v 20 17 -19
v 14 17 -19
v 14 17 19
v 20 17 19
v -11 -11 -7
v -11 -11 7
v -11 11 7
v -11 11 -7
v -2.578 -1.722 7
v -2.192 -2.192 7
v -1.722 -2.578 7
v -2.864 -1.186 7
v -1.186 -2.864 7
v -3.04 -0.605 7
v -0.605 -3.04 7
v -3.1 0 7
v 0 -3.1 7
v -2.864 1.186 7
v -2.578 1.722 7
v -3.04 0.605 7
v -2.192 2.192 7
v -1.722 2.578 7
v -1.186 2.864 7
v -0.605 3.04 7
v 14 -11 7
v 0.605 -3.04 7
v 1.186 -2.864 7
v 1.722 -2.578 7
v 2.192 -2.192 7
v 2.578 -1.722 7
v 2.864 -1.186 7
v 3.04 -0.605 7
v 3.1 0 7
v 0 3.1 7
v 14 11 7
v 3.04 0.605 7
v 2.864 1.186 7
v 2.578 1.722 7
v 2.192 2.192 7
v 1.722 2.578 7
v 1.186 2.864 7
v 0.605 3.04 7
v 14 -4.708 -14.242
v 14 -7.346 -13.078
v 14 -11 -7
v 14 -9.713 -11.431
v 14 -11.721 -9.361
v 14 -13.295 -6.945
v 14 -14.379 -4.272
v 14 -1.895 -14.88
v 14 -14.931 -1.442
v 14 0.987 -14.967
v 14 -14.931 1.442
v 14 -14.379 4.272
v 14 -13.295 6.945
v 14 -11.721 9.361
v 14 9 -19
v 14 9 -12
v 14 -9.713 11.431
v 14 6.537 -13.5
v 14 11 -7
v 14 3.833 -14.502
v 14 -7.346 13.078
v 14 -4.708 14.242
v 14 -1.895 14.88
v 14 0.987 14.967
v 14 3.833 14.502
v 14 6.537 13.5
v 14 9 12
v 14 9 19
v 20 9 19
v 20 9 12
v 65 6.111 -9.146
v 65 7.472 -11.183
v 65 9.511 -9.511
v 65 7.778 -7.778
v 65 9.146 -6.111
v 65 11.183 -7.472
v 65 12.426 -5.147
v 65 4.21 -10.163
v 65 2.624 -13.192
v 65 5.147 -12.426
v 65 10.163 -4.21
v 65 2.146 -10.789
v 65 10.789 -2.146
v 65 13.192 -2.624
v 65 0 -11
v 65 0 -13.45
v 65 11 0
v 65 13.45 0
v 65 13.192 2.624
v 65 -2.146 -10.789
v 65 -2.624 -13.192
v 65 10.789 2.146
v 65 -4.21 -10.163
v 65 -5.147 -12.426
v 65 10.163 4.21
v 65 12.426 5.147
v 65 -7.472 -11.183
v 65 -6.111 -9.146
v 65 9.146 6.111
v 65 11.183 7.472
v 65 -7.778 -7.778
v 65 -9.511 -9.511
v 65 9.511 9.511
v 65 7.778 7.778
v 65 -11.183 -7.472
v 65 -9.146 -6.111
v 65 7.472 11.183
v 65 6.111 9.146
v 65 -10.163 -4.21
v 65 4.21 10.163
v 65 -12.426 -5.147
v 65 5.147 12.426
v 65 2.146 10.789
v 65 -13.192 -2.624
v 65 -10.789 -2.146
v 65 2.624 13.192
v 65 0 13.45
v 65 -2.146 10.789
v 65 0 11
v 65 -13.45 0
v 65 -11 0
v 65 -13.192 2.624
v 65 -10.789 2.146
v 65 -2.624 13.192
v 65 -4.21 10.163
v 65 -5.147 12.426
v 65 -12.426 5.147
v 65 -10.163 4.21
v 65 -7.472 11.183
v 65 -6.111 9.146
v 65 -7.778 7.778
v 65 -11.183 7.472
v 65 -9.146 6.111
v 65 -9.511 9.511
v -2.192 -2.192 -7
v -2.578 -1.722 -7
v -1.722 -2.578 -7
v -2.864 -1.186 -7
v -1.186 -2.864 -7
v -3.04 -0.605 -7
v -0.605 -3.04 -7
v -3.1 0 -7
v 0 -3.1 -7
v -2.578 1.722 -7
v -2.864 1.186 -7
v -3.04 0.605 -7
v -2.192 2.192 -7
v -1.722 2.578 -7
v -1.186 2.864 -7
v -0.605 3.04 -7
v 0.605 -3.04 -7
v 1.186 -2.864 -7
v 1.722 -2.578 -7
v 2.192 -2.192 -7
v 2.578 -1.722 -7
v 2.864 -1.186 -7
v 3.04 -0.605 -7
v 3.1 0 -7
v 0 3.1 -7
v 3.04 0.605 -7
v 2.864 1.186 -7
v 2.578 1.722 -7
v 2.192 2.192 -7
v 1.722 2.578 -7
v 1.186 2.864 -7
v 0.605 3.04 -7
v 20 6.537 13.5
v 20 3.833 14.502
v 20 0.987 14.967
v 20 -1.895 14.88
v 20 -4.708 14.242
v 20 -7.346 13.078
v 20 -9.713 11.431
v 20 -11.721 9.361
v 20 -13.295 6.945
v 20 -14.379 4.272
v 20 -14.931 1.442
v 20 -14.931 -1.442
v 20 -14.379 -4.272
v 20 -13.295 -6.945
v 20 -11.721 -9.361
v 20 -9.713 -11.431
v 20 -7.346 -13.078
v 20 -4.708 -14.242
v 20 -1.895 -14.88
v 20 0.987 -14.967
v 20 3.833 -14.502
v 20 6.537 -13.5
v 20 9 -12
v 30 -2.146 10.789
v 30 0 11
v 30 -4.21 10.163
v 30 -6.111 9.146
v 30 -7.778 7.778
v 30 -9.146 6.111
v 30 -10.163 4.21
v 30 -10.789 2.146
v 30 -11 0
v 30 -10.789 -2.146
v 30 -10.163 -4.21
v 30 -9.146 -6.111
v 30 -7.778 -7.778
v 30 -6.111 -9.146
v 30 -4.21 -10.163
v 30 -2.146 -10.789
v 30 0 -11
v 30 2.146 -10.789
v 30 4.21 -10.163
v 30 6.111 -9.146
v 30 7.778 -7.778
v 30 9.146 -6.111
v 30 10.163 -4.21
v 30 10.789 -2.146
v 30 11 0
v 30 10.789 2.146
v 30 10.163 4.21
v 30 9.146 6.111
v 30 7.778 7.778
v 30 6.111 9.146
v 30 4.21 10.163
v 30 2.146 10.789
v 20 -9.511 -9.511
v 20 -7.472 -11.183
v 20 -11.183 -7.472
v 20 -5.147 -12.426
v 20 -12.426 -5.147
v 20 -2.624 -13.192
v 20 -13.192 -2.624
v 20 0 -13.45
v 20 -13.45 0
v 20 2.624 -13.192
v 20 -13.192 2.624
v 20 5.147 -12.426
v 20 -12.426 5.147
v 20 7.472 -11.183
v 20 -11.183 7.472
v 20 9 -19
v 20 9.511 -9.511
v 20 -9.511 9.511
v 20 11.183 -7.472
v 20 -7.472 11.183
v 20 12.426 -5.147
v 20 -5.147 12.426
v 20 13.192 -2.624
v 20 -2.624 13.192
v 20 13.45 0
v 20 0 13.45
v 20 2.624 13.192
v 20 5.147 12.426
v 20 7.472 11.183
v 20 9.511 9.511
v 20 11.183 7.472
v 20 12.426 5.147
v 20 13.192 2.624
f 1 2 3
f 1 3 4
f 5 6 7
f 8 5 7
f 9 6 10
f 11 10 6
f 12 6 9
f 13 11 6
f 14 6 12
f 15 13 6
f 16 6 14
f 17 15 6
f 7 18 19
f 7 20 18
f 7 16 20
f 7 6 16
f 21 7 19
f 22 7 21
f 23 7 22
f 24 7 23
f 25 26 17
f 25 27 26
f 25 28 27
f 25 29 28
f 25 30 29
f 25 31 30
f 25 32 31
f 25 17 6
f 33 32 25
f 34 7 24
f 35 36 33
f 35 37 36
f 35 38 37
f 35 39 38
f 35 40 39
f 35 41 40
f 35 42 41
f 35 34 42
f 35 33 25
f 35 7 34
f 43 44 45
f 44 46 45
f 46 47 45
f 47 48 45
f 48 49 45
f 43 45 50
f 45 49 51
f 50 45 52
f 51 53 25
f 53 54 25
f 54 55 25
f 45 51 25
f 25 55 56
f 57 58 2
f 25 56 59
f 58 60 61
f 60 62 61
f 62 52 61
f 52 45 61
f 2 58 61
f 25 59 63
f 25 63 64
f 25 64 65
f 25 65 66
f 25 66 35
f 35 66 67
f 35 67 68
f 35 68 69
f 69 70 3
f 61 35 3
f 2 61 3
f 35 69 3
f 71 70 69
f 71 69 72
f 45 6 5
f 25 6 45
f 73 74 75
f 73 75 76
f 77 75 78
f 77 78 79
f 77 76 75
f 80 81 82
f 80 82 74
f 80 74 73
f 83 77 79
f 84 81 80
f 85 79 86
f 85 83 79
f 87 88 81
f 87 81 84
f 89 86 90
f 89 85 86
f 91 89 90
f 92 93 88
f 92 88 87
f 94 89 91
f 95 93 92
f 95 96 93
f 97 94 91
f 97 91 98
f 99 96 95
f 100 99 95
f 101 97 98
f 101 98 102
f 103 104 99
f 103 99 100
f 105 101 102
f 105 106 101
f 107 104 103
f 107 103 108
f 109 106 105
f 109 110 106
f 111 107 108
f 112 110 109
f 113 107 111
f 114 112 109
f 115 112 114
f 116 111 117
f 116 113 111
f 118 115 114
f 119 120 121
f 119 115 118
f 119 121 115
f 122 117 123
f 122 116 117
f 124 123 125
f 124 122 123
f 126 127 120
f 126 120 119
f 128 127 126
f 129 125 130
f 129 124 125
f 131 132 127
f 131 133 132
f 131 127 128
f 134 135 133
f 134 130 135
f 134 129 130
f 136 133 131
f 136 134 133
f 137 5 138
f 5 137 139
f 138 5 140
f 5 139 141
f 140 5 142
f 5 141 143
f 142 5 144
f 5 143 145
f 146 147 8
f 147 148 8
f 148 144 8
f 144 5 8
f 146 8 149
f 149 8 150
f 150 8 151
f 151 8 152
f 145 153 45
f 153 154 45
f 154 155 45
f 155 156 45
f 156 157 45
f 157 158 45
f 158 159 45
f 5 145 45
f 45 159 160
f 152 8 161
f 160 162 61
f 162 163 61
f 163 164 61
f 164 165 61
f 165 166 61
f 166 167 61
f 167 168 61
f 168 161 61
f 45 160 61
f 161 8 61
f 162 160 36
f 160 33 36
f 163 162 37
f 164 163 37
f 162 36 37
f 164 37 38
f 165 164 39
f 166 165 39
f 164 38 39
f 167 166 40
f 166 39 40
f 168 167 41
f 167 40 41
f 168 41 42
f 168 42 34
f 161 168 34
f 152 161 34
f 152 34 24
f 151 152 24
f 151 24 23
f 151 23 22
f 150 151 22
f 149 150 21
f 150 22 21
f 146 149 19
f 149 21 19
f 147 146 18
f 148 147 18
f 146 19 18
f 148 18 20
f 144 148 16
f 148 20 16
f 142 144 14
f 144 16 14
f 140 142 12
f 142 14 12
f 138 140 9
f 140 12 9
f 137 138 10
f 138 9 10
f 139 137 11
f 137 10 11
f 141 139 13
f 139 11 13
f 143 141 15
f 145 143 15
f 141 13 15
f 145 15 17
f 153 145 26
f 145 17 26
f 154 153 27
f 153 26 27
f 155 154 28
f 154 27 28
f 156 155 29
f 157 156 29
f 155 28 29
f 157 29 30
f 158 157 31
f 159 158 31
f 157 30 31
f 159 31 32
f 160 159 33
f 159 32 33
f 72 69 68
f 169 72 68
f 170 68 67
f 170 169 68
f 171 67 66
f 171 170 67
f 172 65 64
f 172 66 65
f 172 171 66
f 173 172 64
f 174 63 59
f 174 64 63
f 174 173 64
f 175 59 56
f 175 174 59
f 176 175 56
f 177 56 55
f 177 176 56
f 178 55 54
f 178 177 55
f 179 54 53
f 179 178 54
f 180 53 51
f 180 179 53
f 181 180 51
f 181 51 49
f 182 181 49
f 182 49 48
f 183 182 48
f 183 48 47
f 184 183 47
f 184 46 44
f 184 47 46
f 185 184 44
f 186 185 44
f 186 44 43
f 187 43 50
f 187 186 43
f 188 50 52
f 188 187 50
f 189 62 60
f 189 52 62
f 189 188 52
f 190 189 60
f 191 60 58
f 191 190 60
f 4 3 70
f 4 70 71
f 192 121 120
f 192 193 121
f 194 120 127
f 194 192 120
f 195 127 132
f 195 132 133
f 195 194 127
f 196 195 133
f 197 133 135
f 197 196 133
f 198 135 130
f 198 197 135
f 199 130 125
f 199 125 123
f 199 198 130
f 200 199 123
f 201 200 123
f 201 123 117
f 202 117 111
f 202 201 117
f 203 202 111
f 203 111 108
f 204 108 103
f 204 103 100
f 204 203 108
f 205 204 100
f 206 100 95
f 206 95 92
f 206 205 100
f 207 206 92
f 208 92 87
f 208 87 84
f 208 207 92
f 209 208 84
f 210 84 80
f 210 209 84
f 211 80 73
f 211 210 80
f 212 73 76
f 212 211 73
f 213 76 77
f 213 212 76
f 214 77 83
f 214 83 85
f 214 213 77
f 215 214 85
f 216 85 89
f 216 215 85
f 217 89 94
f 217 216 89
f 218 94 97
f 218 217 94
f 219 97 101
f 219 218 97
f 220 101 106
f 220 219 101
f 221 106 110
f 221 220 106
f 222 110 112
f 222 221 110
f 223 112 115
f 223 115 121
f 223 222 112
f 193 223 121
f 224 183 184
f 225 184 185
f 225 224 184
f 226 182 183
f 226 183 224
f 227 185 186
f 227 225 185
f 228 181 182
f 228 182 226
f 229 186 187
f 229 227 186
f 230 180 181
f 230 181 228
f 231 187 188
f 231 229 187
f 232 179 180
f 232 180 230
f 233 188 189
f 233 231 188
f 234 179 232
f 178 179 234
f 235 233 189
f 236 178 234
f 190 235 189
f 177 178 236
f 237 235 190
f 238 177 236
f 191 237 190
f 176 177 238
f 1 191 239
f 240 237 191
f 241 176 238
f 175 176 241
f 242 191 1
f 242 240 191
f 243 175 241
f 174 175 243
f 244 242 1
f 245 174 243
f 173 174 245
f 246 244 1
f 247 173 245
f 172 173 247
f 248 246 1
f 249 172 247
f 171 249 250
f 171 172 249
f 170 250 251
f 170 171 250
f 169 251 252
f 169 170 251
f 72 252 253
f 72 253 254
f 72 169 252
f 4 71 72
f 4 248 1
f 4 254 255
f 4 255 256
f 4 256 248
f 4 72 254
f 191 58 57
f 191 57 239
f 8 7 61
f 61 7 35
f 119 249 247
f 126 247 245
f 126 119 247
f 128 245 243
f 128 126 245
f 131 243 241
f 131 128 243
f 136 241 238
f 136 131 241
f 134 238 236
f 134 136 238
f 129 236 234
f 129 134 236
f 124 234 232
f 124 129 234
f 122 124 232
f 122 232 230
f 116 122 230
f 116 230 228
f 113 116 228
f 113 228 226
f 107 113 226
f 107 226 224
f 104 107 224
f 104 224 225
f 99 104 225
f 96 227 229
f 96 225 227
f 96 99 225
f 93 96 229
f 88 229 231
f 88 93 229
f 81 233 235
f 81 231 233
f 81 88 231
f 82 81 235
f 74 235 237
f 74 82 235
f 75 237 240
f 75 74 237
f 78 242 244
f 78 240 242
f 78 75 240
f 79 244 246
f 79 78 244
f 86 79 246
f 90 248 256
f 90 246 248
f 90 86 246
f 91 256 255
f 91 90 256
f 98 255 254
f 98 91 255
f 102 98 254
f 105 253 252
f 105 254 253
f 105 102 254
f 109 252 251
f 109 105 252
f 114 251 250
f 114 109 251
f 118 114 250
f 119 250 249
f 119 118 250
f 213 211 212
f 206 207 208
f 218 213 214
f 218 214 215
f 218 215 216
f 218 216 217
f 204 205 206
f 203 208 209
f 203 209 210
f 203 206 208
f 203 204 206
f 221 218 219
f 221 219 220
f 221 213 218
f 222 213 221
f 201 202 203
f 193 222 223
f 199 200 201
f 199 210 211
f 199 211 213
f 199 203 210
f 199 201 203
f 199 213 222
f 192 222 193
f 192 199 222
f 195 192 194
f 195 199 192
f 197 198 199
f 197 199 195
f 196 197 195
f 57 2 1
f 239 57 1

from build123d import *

# Parameters (mm, degrees)
TONGUE_SKETCH_W   = 27
TONGUE_SKETCH_H   = 22
TONGUE_DEPTH      = 7
PAD_SKETCH_W      = 6
PAD_SKETCH_H      = 8
SWITCH_PAD_DEPTH  = 19
PIN_HOLE_SKETCH_R = 3.1
PIN_HOLE_DEPTH    = 10


with BuildPart() as part:
    # Stem Sketch → Stem (revolve)
    with BuildSketch(Plane.XY):
        Polygon((14, 0), (14, 15), (20, 15), (20, 13.45), (65, 13.45), (65, 11), (30, 11), (30, 0), align=None)
    revolve(axis=Axis((-3000, 0, 0), (1, 0, 0)))

    # Tongue Sketch → Tongue (add, symmetric)
    with BuildSketch(Plane.XY):
        with Locations((2.5, 0)):
            Rectangle(TONGUE_SKETCH_W, TONGUE_SKETCH_H)
    extrude(amount=TONGUE_DEPTH, both=True)

    # Pad Sketch → Switch Pad (add, symmetric)
    with BuildSketch(Plane.XY):
        with Locations((17, 13)):
            Rectangle(PAD_SKETCH_W, PAD_SKETCH_H)
    extrude(amount=SWITCH_PAD_DEPTH, both=True)

    # Pin Hole Sketch → Pin Hole (cut, symmetric)
    with BuildSketch(Plane.XY):
        Circle(PIN_HOLE_SKETCH_R)
    extrude(amount=PIN_HOLE_DEPTH, both=True, mode=Mode.SUBTRACT)


solid = part.part
